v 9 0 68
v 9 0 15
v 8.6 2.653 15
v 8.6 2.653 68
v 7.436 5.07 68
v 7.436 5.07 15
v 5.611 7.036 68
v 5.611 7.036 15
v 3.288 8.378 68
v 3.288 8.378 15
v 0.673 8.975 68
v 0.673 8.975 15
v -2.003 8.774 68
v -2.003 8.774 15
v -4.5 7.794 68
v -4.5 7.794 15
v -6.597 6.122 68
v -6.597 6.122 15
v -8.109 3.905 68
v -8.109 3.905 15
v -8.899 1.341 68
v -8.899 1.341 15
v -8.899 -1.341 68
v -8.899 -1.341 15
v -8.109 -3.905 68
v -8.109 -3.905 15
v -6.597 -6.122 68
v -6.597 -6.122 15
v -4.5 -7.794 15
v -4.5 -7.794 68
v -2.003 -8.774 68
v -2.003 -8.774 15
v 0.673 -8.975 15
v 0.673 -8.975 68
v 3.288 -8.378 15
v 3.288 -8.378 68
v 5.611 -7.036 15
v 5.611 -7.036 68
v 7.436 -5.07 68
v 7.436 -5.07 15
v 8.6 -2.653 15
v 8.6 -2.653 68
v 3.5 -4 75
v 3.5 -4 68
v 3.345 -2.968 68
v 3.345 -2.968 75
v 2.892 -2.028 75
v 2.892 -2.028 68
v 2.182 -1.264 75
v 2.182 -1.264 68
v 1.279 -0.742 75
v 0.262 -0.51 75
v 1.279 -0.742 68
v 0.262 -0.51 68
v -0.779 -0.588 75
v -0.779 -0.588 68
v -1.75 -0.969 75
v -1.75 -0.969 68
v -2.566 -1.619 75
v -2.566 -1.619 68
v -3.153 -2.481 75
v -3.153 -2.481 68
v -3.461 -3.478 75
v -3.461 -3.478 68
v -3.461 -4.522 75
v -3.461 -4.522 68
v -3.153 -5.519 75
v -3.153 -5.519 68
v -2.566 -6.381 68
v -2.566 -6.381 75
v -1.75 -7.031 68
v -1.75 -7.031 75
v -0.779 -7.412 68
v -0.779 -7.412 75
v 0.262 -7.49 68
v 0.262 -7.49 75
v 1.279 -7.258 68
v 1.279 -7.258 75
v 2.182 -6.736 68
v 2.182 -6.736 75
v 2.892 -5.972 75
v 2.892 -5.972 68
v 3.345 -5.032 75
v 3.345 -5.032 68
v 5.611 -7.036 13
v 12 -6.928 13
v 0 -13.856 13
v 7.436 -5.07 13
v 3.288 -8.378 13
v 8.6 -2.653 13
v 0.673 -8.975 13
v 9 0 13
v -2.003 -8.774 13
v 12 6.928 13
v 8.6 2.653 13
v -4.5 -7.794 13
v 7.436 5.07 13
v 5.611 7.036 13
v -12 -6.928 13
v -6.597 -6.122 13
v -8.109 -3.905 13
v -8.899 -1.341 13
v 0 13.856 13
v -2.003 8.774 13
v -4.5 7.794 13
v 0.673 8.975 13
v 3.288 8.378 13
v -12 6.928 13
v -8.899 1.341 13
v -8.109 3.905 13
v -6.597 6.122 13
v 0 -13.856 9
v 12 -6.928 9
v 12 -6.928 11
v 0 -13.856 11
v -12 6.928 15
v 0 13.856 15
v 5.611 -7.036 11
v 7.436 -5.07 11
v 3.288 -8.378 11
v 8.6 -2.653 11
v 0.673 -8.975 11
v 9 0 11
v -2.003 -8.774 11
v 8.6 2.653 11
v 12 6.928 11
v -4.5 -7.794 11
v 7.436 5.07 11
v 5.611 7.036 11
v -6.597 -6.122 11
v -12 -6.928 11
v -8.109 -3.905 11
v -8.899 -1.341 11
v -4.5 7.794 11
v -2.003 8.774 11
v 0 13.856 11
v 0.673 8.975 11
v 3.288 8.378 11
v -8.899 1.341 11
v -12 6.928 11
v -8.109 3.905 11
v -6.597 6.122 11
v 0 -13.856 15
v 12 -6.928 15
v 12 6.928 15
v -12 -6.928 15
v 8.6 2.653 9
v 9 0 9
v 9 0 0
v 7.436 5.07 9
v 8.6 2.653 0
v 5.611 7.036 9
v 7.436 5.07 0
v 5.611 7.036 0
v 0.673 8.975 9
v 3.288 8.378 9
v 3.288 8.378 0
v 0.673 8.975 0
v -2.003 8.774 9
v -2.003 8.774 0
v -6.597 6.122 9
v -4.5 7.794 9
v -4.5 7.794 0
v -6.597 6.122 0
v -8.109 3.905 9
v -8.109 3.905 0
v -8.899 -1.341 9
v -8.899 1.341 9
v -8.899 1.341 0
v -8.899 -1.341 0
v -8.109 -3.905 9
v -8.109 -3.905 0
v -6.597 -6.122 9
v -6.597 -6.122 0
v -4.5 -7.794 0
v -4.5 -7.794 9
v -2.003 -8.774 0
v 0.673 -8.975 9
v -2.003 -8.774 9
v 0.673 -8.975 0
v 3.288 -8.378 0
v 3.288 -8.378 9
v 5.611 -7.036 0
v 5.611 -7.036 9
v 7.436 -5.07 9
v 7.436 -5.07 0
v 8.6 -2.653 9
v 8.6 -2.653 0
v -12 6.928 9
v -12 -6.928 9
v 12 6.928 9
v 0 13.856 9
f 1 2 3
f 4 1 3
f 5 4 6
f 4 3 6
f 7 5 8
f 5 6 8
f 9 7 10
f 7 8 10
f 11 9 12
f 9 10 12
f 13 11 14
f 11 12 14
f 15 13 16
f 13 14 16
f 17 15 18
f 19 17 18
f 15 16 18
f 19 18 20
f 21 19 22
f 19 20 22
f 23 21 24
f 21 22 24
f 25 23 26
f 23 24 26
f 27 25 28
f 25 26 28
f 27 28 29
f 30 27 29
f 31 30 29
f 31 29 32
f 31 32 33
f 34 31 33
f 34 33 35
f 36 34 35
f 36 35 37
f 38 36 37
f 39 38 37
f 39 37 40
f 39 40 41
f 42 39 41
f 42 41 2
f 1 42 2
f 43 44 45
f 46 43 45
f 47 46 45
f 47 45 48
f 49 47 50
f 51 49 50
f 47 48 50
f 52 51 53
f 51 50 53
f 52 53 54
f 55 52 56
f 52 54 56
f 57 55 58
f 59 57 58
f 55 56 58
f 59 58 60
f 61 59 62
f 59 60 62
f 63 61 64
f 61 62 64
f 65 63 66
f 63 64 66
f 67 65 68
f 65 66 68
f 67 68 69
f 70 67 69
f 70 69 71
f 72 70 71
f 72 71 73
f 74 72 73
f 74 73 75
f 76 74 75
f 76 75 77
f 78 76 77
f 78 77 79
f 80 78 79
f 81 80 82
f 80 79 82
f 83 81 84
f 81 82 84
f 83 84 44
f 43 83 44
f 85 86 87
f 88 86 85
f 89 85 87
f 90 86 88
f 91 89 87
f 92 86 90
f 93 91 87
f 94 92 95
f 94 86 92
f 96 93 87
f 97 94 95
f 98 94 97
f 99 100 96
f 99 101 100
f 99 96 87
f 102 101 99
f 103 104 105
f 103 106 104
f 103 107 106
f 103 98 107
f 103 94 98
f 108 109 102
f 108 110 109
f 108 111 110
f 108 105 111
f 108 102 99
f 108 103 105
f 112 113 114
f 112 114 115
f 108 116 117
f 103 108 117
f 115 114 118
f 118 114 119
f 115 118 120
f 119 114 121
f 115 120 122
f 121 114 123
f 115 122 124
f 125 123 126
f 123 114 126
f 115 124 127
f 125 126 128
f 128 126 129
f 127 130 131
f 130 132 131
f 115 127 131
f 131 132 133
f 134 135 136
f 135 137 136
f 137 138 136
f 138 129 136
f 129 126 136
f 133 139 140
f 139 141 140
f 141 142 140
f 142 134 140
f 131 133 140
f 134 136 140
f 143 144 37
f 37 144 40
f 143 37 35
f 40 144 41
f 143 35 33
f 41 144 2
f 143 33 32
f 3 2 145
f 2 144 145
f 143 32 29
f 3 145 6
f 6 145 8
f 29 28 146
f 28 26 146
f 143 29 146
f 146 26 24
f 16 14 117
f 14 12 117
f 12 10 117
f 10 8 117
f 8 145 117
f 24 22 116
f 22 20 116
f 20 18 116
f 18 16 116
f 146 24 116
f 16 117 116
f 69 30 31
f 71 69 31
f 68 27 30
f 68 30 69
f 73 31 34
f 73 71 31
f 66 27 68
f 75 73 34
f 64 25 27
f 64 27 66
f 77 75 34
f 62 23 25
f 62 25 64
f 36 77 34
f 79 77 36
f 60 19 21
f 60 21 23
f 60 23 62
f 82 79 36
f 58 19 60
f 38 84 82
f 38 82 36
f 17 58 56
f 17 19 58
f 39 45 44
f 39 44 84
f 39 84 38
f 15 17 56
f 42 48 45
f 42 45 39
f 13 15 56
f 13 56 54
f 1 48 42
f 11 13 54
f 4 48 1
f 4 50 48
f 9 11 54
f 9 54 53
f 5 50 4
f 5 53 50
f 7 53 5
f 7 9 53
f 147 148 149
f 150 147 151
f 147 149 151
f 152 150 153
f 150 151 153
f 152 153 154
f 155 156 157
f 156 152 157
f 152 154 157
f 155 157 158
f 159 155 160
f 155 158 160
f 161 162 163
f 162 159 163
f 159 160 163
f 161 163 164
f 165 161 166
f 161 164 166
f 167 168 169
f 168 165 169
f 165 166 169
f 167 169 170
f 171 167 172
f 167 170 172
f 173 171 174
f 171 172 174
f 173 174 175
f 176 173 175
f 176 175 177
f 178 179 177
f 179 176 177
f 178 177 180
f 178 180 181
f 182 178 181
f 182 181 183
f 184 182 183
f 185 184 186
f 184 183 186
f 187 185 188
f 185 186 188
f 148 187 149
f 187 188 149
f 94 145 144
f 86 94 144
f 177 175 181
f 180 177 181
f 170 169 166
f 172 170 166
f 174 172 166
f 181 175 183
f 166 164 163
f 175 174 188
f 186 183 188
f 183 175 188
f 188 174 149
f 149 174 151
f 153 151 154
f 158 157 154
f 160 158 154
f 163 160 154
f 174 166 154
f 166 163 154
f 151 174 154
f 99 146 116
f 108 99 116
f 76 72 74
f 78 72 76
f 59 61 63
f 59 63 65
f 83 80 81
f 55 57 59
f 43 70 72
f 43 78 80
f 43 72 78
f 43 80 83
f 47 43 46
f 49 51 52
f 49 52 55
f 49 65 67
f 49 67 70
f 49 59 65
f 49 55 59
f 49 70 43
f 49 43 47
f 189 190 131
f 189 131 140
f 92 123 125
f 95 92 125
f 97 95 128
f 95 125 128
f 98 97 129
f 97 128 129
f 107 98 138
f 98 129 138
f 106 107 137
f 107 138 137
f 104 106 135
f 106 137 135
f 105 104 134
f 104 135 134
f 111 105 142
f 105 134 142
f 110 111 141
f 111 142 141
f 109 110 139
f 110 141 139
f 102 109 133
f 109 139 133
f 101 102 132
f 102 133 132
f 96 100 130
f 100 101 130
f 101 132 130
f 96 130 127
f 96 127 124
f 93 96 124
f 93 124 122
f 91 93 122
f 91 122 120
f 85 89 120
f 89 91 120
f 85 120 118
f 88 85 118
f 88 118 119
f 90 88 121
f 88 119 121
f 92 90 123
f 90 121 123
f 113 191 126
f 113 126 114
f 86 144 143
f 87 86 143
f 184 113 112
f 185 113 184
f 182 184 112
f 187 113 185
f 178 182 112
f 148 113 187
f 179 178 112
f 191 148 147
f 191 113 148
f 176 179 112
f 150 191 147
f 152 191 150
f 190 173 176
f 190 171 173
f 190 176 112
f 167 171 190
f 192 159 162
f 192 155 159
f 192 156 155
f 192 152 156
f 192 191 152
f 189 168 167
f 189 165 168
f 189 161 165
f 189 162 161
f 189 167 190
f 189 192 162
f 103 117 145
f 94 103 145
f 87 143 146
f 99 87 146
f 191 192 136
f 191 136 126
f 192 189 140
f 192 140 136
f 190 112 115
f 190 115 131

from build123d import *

# Parameters (mm, degrees)
SKETCH1_R           = 9
BOSS_EXTRUDE1_DEPTH = 68
SKETCH2_R           = 3.5
BOSS_EXTRUDE2_DEPTH = 7
BOSS_EXTRUDE3_DEPTH = 2
BOSS_EXTRUDE4_START = -6
BOSS_EXTRUDE4_DEPTH = 2


with BuildPart() as part:
    # Sketch1 → Boss-Extrude1 (new body)
    with BuildSketch(Plane.XY):
        Circle(SKETCH1_R)
    extrude(amount=BOSS_EXTRUDE1_DEPTH)

    # Sketch2 → Boss-Extrude2 (add)
    with BuildSketch(Plane.XY.offset(68)):
        with Locations((0, -4)):
            Circle(SKETCH2_R)
    extrude(amount=BOSS_EXTRUDE2_DEPTH)

    # Sketch4 → Boss-Extrude3 (add)
    with BuildSketch(Plane(origin=(0, 0, 9), x_dir=(-1, 0, 0), z_dir=(0, 0, -1))):
        Polygon((-12, 6.92820323), (-12, -6.92820323), (0, -13.856406461), (12, -6.92820323), (12, 6.92820323), (0, 13.856406461), align=None)
    extrude(amount=-BOSS_EXTRUDE3_DEPTH)

    # Sketch4<2> → Boss-Extrude4 (add)
    with BuildSketch(Plane(origin=(0, 0, 9), x_dir=(-1, 0, 0), z_dir=(0, 0, -1)).offset(BOSS_EXTRUDE4_START)):
        Polygon((-12, 6.92820323), (-12, -6.92820323), (0, -13.856406461), (12, -6.92820323), (12, 6.92820323), (0, 13.856406461), align=None)
    extrude(amount=BOSS_EXTRUDE4_DEPTH)


solid = part.part
